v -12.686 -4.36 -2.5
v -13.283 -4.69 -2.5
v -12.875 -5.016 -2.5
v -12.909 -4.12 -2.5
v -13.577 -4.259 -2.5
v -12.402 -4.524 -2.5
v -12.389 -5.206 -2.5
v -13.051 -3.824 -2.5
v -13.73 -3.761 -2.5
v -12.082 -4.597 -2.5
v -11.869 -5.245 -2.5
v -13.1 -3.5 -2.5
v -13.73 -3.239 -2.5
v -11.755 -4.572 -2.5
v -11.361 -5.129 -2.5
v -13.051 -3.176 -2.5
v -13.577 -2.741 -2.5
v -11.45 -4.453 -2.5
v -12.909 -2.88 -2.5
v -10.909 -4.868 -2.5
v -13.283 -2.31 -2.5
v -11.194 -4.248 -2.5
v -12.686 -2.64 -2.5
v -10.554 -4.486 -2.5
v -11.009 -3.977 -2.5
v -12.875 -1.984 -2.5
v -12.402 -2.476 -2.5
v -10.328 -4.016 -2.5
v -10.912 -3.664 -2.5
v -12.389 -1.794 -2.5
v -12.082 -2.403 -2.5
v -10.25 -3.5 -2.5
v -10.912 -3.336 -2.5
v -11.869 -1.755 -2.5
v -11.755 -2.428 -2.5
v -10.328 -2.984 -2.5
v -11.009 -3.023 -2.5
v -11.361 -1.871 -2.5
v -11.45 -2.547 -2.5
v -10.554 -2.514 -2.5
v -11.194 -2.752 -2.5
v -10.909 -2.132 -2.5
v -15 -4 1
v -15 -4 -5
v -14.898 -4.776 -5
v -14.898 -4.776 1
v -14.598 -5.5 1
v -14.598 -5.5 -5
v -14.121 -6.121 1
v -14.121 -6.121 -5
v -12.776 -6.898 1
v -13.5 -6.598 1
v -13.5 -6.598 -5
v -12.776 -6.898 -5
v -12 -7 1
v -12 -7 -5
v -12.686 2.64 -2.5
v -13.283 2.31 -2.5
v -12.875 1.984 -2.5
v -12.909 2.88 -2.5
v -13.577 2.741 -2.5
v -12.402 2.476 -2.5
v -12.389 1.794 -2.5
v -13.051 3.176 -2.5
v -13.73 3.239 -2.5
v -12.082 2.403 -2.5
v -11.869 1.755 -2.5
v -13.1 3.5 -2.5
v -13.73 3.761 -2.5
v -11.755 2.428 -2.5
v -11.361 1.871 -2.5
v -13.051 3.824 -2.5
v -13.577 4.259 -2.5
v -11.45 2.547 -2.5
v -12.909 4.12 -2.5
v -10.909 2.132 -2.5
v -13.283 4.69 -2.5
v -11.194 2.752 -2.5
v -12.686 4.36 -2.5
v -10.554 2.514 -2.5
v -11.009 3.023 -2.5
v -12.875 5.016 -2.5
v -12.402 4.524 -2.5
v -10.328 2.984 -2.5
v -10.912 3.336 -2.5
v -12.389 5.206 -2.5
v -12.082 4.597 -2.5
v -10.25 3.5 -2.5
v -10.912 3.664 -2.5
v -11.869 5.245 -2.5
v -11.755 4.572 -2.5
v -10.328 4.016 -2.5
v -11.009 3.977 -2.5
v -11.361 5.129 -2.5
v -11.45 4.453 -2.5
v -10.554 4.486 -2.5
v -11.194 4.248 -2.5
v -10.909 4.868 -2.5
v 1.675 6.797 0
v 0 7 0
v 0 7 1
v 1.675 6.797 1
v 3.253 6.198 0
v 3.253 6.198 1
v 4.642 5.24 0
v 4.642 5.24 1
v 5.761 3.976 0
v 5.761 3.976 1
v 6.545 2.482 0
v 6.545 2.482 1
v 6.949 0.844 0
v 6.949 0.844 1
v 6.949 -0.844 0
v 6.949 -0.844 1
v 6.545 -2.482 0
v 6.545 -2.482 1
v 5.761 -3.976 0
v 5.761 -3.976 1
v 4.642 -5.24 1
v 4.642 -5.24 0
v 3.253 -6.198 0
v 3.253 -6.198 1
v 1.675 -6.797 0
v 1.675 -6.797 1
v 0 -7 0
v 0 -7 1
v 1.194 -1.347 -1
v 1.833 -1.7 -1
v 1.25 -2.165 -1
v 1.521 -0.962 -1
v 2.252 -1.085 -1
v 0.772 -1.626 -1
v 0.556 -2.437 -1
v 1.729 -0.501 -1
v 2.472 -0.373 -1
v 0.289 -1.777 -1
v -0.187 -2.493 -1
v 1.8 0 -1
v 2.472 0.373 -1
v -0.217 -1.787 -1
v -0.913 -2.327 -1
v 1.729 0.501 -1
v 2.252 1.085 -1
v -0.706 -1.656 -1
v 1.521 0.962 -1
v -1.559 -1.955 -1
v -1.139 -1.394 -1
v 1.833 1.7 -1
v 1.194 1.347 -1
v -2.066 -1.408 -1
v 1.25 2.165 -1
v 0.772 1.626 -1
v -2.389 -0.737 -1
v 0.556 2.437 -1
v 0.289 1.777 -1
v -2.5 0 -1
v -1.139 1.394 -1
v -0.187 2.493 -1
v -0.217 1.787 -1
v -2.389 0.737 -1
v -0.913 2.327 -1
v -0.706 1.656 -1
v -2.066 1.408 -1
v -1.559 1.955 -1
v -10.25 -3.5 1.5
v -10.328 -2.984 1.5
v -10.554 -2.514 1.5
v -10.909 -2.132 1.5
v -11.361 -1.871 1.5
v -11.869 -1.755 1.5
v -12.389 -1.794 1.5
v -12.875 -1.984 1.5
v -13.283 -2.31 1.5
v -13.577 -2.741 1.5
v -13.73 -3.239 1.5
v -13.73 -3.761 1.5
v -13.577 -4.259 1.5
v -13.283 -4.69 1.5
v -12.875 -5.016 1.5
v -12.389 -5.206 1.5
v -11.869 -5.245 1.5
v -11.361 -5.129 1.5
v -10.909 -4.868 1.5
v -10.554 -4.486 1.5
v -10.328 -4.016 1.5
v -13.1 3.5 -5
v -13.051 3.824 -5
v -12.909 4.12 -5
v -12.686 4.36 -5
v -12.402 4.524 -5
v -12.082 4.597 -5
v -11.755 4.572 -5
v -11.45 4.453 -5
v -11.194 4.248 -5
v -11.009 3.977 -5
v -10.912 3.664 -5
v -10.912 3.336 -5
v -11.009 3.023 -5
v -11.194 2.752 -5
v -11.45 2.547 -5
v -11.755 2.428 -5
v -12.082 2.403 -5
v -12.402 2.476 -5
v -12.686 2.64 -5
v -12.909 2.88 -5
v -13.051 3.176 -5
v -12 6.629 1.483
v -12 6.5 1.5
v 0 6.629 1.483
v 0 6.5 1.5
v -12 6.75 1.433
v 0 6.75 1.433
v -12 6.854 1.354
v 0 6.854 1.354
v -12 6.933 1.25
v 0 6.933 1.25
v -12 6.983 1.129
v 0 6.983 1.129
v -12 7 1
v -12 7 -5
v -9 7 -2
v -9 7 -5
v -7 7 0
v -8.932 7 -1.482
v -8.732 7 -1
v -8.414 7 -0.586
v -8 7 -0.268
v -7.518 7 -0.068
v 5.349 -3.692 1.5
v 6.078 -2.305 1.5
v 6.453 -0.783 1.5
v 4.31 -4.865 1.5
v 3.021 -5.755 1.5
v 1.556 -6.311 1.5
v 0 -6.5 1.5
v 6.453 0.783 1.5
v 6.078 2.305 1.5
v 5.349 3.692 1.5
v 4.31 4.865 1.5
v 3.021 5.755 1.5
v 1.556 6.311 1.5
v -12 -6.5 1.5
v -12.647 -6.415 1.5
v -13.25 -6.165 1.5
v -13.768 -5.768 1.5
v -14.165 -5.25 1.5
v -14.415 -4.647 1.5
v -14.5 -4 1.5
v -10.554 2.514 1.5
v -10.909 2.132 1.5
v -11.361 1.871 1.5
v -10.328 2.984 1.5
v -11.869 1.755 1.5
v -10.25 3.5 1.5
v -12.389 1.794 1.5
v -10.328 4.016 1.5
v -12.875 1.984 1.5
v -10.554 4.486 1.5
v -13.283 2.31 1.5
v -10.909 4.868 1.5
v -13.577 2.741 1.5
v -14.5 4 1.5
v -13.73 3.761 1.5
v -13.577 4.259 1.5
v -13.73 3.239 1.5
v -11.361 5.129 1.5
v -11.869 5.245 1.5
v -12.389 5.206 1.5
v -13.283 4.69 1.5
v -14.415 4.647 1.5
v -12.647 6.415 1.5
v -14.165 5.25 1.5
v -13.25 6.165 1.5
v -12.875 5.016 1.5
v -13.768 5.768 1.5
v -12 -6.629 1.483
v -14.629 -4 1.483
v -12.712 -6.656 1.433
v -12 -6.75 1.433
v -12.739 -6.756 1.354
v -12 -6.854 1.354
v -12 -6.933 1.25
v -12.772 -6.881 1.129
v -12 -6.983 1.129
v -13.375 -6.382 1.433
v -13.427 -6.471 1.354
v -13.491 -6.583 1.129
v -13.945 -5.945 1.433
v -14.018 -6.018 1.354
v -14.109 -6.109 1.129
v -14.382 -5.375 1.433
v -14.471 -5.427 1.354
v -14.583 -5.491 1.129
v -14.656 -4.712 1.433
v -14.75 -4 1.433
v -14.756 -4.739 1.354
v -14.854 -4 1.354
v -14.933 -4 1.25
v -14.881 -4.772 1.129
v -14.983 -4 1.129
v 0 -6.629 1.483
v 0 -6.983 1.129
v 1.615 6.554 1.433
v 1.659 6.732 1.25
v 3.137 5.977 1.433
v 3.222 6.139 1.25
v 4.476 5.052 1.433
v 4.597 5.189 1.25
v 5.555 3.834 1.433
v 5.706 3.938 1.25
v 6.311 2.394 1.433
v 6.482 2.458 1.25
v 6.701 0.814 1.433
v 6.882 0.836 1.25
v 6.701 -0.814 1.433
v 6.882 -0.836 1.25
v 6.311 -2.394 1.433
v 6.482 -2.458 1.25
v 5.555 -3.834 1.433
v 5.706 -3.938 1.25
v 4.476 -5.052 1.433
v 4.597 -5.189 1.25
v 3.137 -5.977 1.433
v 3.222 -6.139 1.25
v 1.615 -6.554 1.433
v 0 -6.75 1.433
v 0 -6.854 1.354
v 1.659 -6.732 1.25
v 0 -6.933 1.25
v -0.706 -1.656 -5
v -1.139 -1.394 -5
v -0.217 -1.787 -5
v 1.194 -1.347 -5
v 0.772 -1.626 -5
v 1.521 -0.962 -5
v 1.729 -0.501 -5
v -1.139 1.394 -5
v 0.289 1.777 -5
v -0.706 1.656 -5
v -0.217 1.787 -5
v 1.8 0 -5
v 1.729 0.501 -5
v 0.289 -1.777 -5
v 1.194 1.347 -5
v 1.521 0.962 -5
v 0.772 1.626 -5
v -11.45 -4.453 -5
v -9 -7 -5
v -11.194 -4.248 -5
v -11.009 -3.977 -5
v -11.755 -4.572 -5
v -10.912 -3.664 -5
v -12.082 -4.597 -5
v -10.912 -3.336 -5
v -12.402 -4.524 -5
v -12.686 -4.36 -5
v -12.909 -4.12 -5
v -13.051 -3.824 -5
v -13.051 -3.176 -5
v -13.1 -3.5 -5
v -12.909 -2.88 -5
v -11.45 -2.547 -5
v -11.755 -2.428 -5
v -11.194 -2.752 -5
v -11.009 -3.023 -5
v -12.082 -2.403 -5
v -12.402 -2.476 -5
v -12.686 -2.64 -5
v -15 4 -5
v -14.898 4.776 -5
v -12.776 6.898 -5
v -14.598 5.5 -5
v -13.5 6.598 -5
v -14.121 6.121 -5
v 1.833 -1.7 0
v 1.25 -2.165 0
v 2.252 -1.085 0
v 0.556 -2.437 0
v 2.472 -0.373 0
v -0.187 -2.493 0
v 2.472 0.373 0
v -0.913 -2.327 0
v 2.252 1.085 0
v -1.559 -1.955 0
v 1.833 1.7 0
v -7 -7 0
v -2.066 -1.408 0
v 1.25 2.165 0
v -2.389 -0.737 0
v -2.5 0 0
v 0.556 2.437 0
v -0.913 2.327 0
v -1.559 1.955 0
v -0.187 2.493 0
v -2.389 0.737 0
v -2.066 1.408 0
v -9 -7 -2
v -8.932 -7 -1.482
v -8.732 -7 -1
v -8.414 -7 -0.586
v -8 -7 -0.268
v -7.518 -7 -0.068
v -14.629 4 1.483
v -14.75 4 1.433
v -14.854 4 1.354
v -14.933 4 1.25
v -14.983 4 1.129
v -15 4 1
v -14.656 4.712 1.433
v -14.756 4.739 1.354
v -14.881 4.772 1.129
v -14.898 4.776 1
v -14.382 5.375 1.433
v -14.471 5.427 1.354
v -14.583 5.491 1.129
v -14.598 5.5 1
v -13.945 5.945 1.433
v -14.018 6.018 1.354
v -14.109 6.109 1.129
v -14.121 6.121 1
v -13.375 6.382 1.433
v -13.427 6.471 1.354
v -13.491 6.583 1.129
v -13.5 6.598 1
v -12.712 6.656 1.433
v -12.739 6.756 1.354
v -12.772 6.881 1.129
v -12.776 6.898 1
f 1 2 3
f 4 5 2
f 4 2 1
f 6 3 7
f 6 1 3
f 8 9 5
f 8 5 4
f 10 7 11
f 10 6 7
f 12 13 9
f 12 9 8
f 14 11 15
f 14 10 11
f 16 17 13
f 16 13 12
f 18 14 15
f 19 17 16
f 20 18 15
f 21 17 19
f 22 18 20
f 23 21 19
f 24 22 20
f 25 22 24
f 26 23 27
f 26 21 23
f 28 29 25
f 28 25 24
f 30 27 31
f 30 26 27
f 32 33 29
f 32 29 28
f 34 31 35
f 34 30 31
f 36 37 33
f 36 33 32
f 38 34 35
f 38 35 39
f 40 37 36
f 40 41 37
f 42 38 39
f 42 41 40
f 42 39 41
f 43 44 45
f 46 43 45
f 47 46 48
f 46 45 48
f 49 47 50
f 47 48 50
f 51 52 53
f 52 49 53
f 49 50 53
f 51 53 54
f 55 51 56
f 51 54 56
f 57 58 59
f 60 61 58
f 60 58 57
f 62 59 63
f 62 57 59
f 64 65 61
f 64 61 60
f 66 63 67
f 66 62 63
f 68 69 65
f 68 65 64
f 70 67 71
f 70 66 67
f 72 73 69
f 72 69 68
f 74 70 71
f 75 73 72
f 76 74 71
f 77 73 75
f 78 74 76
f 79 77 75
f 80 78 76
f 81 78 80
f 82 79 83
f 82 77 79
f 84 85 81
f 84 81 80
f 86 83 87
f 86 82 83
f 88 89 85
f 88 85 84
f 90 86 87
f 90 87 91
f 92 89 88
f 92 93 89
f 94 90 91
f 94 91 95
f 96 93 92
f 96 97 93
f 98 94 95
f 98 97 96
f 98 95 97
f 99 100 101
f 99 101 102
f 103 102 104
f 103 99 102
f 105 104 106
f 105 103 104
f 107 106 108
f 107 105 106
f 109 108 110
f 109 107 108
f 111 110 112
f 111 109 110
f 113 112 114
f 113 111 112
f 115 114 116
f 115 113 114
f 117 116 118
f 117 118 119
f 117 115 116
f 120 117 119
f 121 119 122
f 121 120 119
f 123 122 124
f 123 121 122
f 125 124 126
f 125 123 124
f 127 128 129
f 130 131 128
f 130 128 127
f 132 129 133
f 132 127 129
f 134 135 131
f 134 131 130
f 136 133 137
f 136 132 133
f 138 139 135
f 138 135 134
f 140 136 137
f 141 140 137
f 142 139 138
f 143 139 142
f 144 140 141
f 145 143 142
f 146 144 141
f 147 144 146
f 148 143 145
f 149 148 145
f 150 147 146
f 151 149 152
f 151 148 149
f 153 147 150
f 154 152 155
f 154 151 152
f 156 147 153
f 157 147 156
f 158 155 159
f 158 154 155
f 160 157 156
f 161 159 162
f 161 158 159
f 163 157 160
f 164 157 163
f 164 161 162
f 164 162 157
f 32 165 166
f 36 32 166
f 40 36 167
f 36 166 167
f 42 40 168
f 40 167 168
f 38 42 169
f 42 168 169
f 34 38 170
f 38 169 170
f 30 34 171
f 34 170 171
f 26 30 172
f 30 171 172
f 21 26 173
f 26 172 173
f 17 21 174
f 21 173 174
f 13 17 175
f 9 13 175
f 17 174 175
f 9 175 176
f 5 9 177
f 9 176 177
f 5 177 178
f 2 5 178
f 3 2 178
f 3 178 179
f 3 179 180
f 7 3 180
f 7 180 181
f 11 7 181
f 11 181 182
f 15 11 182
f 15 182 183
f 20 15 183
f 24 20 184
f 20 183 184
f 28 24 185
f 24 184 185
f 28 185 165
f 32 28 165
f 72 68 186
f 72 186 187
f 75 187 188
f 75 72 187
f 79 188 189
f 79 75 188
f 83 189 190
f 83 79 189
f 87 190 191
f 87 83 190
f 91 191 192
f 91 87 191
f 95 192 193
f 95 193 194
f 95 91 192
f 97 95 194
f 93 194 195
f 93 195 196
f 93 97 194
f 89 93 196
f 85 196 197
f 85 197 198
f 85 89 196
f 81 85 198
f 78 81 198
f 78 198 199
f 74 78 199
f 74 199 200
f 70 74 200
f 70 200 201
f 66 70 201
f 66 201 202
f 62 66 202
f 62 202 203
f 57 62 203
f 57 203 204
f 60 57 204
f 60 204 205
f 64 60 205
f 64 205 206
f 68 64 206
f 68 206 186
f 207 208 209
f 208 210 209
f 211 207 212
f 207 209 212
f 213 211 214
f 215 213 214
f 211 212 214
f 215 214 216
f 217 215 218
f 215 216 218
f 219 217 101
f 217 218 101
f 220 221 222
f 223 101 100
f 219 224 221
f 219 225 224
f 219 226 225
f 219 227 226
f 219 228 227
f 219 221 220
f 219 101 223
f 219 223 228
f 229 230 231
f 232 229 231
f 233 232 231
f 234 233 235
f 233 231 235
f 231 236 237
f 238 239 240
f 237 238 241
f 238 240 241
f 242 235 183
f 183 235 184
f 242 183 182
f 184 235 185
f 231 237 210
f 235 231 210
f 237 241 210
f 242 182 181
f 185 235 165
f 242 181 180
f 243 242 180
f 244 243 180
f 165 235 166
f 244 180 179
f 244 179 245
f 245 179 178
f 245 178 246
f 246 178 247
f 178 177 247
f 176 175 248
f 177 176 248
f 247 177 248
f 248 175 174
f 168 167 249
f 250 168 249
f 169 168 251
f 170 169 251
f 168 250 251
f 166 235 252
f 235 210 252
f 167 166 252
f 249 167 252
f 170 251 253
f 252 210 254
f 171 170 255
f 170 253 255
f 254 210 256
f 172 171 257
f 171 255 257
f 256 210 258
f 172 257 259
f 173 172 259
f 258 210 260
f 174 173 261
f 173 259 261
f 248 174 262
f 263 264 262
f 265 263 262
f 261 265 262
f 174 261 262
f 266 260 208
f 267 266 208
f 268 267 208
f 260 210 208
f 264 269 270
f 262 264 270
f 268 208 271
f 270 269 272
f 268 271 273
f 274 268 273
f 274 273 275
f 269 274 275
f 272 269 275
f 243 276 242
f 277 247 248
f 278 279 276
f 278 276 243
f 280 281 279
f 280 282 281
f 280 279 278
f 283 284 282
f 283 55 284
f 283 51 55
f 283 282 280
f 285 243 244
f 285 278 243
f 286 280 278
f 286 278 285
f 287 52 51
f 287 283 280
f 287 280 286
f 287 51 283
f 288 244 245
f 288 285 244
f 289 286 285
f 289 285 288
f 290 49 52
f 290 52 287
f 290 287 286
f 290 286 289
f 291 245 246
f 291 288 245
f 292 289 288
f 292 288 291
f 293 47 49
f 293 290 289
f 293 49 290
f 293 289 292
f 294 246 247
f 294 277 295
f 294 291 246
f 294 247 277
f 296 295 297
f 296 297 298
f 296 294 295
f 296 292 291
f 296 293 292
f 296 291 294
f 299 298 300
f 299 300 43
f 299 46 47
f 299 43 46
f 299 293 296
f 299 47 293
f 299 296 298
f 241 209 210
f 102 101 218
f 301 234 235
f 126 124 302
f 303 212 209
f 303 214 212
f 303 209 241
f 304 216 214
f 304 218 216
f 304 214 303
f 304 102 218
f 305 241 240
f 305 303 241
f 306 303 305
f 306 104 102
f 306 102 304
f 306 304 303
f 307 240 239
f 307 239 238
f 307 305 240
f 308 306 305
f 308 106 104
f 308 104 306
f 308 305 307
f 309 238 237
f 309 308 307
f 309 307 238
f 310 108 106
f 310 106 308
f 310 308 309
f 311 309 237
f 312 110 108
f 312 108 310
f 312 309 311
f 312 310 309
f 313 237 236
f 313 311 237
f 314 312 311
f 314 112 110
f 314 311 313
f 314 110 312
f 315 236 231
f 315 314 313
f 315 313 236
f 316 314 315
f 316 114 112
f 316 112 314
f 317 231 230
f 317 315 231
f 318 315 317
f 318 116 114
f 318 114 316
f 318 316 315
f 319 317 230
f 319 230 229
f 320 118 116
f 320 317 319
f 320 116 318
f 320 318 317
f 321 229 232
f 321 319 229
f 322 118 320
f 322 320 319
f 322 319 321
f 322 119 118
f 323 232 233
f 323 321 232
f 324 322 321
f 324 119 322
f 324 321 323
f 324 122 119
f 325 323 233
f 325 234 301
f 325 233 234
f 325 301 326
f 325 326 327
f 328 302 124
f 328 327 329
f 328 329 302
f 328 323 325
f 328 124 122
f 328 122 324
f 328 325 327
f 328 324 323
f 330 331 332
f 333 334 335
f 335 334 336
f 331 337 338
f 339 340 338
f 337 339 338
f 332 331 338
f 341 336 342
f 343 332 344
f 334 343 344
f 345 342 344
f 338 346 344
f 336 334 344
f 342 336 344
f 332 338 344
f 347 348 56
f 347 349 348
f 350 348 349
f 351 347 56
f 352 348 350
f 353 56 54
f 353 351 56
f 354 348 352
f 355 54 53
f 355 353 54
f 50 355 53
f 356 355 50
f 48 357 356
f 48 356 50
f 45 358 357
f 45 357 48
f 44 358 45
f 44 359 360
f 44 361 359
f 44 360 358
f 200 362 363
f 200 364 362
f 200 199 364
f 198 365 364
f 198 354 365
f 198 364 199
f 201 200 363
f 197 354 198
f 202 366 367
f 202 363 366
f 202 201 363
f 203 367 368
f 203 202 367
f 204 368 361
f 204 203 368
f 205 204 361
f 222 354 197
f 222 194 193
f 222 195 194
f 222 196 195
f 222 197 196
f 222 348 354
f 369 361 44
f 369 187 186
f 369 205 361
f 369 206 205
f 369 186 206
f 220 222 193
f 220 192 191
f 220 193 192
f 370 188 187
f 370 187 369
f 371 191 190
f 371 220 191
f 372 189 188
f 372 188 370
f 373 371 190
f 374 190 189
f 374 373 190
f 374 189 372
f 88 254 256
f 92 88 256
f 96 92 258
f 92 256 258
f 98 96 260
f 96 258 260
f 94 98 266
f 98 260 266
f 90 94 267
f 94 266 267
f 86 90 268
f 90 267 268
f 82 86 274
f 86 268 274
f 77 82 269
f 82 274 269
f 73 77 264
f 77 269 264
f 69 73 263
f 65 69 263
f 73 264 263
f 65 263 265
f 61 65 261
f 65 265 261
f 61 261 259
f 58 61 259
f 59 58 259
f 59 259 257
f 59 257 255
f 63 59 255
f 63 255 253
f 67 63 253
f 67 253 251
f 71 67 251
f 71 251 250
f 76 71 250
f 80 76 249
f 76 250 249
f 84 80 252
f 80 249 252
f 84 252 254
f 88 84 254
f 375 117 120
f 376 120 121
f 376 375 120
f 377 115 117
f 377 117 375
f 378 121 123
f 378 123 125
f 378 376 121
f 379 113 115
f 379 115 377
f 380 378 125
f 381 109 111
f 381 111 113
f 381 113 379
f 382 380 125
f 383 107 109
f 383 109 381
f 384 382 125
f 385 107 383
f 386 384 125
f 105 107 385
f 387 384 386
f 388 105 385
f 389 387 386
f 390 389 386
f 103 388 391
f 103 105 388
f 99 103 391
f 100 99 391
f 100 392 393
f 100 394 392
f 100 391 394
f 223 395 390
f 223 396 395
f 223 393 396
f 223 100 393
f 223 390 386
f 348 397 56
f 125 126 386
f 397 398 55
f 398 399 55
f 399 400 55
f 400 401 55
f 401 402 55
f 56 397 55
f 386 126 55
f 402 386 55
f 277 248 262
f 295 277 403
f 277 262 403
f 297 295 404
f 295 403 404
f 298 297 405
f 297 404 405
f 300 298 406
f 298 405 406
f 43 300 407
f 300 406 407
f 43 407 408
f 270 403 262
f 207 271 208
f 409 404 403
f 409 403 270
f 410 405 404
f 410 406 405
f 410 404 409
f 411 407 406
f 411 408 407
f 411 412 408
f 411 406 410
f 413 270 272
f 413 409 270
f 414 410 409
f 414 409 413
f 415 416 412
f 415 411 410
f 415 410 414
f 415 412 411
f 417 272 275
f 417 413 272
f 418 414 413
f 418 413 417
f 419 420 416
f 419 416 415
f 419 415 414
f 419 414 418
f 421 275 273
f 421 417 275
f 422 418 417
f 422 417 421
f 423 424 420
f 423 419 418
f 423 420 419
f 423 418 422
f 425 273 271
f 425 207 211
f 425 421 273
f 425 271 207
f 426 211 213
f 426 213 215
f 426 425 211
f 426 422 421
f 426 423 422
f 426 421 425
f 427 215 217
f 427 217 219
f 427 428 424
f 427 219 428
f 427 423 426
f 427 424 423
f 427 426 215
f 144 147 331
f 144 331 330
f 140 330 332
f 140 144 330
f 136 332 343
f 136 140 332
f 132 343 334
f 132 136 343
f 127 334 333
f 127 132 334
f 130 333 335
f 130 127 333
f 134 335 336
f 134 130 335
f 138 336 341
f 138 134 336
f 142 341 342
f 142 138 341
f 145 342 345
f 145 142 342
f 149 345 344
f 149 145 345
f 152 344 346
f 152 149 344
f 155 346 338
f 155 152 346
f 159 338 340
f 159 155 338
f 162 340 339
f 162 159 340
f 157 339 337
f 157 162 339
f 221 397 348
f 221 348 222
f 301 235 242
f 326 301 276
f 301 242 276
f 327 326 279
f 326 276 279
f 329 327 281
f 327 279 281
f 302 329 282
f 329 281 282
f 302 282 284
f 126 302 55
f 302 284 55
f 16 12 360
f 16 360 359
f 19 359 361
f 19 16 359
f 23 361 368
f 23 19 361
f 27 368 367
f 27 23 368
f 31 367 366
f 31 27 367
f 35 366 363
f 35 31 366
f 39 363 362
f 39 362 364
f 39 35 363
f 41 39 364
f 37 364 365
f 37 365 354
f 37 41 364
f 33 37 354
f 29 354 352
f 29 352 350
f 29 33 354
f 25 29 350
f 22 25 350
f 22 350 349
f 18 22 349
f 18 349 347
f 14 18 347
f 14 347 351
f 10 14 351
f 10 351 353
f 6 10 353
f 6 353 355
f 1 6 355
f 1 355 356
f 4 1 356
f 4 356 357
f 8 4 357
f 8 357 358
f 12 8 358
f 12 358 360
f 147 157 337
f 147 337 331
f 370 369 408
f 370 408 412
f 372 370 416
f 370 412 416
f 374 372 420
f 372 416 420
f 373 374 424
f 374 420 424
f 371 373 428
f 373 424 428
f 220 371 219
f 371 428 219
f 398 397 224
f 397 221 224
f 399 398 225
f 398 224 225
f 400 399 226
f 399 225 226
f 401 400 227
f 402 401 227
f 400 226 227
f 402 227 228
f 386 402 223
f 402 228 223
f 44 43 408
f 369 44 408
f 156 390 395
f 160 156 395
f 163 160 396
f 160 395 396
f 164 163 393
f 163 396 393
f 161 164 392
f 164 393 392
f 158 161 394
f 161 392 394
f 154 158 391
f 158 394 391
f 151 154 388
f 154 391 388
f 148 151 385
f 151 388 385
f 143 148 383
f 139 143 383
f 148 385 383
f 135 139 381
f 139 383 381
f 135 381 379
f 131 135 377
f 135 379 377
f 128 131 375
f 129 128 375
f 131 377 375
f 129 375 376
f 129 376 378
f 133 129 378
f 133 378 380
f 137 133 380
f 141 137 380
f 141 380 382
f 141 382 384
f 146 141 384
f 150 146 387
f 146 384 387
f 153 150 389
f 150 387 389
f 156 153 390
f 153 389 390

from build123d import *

# Parameters (mm, degrees)
SKETCH1_R           = 1.1
BOSS_EXTRUDE1_DEPTH = 1.5
SKETCH2_R           = 2.5
BOSS_EXTRUDE2_DEPTH = 1
BOSS_EXTRUDE3_DEPTH = 4
SKETCH4_W           = 6
SKETCH4_H           = 14
SKETCH4_R           = 1.1
BOSS_EXTRUDE4_DEPTH = 5
FILLET4_R           = 3
FILLET1_R           = 0.5
SKETCH5_R           = 1.75
CUT_EXTRUDE1_DEPTH  = 4
FILLET3_R           = 2


with BuildPart() as part:
    # Sketch1 → Boss-Extrude1 (new body)
    with BuildSketch(Plane.XY):
        with BuildLine():
            Line((-15, 7), (0, 7))
            ThreePointArc((0, 7), (7, 0), (0, -7))
            Line((0, -7), (-15, -7))
            Line((-15, -7), (-15, 7))
        make_face()
        with Locations((-12, 3.5)):
            Circle(SKETCH1_R, mode=Mode.SUBTRACT)
        with Locations((-12, -3.5)):
            Circle(SKETCH1_R, mode=Mode.SUBTRACT)
    extrude(amount=BOSS_EXTRUDE1_DEPTH)

    # Sketch2 → Boss-Extrude2 (add)
    with BuildSketch(Plane(origin=(0, 0, 0), x_dir=(-1, 0, 0), z_dir=(0, 0, -1))):
        Circle(SKETCH2_R)
    extrude(amount=BOSS_EXTRUDE2_DEPTH)

    # Sketch3 → Boss-Extrude3 (add)
    with BuildSketch(Plane(origin=(0, 0, -1), x_dir=(-1, 0, 0), z_dir=(0, 0, -1))):
        with BuildLine():
            Line((1.13862177, 1.394109201), (1.13862177, -1.394109201))
            ThreePointArc((1.13862177, -1.394109201), (-1.8, 0), (1.13862177, 1.394109201))
        make_face()
    extrude(amount=BOSS_EXTRUDE3_DEPTH)

    # Sketch4 → Boss-Extrude4 (add)
    with BuildSketch(Plane(origin=(0, 0, 0), x_dir=(-1, 0, 0), z_dir=(0, 0, -1))):
        with Locations((12, 0)):
            Rectangle(SKETCH4_W, SKETCH4_H)
        with Locations((12, 3.5)):
            Circle(SKETCH4_R, mode=Mode.SUBTRACT)
        with Locations((12, -3.5)):
            Circle(SKETCH4_R, mode=Mode.SUBTRACT)
    extrude(amount=BOSS_EXTRUDE4_DEPTH)

    # Fillet4
    fillet4_edges = [part.edges().sort_by_distance(p)[0] for p in [
        (-15, -7, -1.75),
        (-15, 7, -1.75),
    ]]
    fillet(fillet4_edges, radius=FILLET4_R)

    # Fillet1
    fillet1_edges = [part.edges().sort_by_distance(p)[0] for p in [
        (7, 0, 1.5),
        (-15, 0, 1.5),
        (-6, -7, 1.5),
        (-14.121320344, -6.121320344, 1.5),
        (-14.121320344, 6.121320344, 1.5),
        (-6, 7, 1.5),
    ]]
    fillet(fillet1_edges, radius=FILLET1_R)

    # Sketch5 → Cut-Extrude1 (cut)
    with BuildSketch(Plane.XY.offset(1.5)):
        with Locations((-12, 3.5)):
            Circle(SKETCH5_R)
        with Locations((-12, -3.5)):
            Circle(SKETCH5_R)
    extrude(amount=-CUT_EXTRUDE1_DEPTH, mode=Mode.SUBTRACT)

    # Fillet3
    fillet3_edges = [part.edges().sort_by_distance(p)[0] for p in [
        (-9, 0, 0),
    ]]
    fillet(fillet3_edges, radius=FILLET3_R)


solid = part.part
